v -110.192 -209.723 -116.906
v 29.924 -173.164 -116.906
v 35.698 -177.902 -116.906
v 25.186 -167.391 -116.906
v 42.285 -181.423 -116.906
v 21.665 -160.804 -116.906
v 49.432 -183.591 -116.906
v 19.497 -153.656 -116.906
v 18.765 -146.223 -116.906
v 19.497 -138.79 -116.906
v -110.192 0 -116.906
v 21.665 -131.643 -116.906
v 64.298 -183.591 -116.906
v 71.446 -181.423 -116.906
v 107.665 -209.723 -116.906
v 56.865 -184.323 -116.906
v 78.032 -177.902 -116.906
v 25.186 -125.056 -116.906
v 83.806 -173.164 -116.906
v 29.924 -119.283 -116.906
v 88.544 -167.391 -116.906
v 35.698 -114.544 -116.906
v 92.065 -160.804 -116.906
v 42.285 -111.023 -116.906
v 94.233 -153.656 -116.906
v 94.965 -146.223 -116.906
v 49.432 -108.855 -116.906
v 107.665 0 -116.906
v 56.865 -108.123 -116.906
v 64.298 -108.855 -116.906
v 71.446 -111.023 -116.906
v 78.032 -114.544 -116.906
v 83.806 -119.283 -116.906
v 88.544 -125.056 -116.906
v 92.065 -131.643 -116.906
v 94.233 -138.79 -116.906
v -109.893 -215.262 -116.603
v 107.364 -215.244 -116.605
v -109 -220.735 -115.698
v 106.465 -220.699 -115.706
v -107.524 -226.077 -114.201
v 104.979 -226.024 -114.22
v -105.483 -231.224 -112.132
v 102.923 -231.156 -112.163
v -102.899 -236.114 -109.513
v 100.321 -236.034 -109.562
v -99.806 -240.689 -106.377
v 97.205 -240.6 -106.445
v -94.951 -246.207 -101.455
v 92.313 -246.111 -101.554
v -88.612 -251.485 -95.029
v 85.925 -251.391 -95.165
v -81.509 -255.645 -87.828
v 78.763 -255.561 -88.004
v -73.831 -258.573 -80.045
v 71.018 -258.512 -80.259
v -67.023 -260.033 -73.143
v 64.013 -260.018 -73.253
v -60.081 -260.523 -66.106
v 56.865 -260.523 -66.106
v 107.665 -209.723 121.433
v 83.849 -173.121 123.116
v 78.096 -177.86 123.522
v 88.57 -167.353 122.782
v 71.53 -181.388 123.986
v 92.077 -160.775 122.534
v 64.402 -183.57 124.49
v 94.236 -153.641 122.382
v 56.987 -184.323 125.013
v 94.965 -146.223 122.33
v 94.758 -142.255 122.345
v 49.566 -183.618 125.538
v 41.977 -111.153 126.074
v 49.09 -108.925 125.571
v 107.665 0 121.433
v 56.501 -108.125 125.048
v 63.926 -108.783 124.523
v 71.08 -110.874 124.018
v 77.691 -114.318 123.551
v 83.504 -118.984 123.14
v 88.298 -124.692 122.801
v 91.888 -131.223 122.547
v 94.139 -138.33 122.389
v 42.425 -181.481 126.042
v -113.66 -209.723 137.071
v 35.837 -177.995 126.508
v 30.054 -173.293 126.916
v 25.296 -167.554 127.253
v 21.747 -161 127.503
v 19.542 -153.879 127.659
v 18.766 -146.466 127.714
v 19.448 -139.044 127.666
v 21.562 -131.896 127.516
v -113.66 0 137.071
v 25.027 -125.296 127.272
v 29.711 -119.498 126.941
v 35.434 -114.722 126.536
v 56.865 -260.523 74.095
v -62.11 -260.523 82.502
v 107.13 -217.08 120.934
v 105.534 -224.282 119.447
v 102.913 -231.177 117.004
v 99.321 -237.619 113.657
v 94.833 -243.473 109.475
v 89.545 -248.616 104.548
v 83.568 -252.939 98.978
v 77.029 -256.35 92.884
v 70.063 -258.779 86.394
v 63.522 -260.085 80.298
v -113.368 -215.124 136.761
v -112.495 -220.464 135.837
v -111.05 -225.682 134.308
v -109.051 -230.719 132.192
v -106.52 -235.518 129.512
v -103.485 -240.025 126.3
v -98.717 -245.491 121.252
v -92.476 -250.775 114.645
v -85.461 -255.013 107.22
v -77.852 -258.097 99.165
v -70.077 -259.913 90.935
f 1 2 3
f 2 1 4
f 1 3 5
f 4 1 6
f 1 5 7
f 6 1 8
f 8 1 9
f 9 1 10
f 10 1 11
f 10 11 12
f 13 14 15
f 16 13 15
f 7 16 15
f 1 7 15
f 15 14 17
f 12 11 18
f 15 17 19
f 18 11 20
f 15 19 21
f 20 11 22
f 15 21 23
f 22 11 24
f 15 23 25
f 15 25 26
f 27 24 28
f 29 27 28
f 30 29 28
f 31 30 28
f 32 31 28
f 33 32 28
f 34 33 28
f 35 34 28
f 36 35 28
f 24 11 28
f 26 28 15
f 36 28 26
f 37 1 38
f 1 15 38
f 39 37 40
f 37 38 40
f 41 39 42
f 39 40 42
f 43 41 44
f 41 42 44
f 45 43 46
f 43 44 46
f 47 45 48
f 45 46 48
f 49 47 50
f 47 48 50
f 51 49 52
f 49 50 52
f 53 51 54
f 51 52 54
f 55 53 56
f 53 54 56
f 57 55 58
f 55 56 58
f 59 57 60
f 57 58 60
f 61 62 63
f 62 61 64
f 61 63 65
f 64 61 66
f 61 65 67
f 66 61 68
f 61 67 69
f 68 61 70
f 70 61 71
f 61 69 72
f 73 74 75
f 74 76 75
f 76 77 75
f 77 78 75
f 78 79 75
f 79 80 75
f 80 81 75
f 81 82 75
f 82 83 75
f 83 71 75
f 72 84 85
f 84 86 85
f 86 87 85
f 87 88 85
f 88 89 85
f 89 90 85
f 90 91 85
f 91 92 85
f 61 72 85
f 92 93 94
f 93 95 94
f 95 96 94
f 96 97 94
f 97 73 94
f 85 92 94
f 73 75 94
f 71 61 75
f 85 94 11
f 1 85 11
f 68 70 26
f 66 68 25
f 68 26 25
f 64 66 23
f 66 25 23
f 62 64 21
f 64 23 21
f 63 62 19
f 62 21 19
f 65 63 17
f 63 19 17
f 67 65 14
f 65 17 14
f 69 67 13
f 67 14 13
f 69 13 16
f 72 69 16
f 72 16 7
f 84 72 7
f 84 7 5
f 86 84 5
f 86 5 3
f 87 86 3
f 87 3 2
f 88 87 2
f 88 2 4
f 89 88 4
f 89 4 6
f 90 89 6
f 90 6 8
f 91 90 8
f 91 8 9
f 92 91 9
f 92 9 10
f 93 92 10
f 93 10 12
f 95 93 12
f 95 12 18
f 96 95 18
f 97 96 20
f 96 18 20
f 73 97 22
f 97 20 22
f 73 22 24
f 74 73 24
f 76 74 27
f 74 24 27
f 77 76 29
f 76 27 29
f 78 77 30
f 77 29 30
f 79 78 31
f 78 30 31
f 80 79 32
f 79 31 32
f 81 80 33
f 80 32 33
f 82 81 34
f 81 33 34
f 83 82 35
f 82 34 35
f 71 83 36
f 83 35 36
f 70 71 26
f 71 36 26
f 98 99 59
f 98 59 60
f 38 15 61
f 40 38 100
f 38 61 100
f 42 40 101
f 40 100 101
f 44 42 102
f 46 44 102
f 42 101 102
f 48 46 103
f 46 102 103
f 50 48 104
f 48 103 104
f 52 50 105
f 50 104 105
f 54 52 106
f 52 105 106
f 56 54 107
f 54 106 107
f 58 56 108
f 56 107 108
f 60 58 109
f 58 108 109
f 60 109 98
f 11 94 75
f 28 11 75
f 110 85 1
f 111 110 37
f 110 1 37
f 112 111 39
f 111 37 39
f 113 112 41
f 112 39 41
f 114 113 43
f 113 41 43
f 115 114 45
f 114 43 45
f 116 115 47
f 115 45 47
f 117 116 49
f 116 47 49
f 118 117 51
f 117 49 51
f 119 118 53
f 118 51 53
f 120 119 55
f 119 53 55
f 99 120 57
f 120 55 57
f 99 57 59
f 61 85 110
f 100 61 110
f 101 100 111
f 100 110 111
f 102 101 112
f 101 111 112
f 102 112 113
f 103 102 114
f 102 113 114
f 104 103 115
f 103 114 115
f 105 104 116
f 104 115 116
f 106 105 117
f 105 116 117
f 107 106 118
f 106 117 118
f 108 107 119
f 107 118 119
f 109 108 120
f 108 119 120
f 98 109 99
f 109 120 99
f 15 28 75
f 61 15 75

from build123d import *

# Parameters (mm, degrees)
F3_DEPTH = 260.523276
F4_R     = 50.8
F0_R     = 38.1
F1_DEPTH = 285.439702


with BuildPart() as f3:
    # F2 (on Front) → F3 (new body)
    with BuildSketch(Plane.XZ):
        Polygon((-113.660068, 137.07054), (-110.191997, -116.905782), (107.665264, -116.905782), (107.665264, 121.432772), align=None)
    extrude(amount=F3_DEPTH)

    # F4
    f4_edges = [f3.edges().sort_by_distance(p)[0] for p in [
        (-2.997402, -260.523276, 129.251656),
        (-111.926032, -260.523276, 10.082379),
        (-1.263367, -260.523276, -116.905782),
        (107.665264, -260.523276, 2.263495),
    ]]
    fillet(f4_edges, radius=F4_R)

    # F0 (on face) → F1 (cut)
    with BuildSketch(Plane(origin=(0, 0, -116.905782), x_dir=(1, 0, 0), z_dir=(0, 0, -1))):
        with Locations((56.865264, 146.223276)):
            Circle(F0_R)
    extrude(amount=-F1_DEPTH, mode=Mode.SUBTRACT)


solid = f3.part
